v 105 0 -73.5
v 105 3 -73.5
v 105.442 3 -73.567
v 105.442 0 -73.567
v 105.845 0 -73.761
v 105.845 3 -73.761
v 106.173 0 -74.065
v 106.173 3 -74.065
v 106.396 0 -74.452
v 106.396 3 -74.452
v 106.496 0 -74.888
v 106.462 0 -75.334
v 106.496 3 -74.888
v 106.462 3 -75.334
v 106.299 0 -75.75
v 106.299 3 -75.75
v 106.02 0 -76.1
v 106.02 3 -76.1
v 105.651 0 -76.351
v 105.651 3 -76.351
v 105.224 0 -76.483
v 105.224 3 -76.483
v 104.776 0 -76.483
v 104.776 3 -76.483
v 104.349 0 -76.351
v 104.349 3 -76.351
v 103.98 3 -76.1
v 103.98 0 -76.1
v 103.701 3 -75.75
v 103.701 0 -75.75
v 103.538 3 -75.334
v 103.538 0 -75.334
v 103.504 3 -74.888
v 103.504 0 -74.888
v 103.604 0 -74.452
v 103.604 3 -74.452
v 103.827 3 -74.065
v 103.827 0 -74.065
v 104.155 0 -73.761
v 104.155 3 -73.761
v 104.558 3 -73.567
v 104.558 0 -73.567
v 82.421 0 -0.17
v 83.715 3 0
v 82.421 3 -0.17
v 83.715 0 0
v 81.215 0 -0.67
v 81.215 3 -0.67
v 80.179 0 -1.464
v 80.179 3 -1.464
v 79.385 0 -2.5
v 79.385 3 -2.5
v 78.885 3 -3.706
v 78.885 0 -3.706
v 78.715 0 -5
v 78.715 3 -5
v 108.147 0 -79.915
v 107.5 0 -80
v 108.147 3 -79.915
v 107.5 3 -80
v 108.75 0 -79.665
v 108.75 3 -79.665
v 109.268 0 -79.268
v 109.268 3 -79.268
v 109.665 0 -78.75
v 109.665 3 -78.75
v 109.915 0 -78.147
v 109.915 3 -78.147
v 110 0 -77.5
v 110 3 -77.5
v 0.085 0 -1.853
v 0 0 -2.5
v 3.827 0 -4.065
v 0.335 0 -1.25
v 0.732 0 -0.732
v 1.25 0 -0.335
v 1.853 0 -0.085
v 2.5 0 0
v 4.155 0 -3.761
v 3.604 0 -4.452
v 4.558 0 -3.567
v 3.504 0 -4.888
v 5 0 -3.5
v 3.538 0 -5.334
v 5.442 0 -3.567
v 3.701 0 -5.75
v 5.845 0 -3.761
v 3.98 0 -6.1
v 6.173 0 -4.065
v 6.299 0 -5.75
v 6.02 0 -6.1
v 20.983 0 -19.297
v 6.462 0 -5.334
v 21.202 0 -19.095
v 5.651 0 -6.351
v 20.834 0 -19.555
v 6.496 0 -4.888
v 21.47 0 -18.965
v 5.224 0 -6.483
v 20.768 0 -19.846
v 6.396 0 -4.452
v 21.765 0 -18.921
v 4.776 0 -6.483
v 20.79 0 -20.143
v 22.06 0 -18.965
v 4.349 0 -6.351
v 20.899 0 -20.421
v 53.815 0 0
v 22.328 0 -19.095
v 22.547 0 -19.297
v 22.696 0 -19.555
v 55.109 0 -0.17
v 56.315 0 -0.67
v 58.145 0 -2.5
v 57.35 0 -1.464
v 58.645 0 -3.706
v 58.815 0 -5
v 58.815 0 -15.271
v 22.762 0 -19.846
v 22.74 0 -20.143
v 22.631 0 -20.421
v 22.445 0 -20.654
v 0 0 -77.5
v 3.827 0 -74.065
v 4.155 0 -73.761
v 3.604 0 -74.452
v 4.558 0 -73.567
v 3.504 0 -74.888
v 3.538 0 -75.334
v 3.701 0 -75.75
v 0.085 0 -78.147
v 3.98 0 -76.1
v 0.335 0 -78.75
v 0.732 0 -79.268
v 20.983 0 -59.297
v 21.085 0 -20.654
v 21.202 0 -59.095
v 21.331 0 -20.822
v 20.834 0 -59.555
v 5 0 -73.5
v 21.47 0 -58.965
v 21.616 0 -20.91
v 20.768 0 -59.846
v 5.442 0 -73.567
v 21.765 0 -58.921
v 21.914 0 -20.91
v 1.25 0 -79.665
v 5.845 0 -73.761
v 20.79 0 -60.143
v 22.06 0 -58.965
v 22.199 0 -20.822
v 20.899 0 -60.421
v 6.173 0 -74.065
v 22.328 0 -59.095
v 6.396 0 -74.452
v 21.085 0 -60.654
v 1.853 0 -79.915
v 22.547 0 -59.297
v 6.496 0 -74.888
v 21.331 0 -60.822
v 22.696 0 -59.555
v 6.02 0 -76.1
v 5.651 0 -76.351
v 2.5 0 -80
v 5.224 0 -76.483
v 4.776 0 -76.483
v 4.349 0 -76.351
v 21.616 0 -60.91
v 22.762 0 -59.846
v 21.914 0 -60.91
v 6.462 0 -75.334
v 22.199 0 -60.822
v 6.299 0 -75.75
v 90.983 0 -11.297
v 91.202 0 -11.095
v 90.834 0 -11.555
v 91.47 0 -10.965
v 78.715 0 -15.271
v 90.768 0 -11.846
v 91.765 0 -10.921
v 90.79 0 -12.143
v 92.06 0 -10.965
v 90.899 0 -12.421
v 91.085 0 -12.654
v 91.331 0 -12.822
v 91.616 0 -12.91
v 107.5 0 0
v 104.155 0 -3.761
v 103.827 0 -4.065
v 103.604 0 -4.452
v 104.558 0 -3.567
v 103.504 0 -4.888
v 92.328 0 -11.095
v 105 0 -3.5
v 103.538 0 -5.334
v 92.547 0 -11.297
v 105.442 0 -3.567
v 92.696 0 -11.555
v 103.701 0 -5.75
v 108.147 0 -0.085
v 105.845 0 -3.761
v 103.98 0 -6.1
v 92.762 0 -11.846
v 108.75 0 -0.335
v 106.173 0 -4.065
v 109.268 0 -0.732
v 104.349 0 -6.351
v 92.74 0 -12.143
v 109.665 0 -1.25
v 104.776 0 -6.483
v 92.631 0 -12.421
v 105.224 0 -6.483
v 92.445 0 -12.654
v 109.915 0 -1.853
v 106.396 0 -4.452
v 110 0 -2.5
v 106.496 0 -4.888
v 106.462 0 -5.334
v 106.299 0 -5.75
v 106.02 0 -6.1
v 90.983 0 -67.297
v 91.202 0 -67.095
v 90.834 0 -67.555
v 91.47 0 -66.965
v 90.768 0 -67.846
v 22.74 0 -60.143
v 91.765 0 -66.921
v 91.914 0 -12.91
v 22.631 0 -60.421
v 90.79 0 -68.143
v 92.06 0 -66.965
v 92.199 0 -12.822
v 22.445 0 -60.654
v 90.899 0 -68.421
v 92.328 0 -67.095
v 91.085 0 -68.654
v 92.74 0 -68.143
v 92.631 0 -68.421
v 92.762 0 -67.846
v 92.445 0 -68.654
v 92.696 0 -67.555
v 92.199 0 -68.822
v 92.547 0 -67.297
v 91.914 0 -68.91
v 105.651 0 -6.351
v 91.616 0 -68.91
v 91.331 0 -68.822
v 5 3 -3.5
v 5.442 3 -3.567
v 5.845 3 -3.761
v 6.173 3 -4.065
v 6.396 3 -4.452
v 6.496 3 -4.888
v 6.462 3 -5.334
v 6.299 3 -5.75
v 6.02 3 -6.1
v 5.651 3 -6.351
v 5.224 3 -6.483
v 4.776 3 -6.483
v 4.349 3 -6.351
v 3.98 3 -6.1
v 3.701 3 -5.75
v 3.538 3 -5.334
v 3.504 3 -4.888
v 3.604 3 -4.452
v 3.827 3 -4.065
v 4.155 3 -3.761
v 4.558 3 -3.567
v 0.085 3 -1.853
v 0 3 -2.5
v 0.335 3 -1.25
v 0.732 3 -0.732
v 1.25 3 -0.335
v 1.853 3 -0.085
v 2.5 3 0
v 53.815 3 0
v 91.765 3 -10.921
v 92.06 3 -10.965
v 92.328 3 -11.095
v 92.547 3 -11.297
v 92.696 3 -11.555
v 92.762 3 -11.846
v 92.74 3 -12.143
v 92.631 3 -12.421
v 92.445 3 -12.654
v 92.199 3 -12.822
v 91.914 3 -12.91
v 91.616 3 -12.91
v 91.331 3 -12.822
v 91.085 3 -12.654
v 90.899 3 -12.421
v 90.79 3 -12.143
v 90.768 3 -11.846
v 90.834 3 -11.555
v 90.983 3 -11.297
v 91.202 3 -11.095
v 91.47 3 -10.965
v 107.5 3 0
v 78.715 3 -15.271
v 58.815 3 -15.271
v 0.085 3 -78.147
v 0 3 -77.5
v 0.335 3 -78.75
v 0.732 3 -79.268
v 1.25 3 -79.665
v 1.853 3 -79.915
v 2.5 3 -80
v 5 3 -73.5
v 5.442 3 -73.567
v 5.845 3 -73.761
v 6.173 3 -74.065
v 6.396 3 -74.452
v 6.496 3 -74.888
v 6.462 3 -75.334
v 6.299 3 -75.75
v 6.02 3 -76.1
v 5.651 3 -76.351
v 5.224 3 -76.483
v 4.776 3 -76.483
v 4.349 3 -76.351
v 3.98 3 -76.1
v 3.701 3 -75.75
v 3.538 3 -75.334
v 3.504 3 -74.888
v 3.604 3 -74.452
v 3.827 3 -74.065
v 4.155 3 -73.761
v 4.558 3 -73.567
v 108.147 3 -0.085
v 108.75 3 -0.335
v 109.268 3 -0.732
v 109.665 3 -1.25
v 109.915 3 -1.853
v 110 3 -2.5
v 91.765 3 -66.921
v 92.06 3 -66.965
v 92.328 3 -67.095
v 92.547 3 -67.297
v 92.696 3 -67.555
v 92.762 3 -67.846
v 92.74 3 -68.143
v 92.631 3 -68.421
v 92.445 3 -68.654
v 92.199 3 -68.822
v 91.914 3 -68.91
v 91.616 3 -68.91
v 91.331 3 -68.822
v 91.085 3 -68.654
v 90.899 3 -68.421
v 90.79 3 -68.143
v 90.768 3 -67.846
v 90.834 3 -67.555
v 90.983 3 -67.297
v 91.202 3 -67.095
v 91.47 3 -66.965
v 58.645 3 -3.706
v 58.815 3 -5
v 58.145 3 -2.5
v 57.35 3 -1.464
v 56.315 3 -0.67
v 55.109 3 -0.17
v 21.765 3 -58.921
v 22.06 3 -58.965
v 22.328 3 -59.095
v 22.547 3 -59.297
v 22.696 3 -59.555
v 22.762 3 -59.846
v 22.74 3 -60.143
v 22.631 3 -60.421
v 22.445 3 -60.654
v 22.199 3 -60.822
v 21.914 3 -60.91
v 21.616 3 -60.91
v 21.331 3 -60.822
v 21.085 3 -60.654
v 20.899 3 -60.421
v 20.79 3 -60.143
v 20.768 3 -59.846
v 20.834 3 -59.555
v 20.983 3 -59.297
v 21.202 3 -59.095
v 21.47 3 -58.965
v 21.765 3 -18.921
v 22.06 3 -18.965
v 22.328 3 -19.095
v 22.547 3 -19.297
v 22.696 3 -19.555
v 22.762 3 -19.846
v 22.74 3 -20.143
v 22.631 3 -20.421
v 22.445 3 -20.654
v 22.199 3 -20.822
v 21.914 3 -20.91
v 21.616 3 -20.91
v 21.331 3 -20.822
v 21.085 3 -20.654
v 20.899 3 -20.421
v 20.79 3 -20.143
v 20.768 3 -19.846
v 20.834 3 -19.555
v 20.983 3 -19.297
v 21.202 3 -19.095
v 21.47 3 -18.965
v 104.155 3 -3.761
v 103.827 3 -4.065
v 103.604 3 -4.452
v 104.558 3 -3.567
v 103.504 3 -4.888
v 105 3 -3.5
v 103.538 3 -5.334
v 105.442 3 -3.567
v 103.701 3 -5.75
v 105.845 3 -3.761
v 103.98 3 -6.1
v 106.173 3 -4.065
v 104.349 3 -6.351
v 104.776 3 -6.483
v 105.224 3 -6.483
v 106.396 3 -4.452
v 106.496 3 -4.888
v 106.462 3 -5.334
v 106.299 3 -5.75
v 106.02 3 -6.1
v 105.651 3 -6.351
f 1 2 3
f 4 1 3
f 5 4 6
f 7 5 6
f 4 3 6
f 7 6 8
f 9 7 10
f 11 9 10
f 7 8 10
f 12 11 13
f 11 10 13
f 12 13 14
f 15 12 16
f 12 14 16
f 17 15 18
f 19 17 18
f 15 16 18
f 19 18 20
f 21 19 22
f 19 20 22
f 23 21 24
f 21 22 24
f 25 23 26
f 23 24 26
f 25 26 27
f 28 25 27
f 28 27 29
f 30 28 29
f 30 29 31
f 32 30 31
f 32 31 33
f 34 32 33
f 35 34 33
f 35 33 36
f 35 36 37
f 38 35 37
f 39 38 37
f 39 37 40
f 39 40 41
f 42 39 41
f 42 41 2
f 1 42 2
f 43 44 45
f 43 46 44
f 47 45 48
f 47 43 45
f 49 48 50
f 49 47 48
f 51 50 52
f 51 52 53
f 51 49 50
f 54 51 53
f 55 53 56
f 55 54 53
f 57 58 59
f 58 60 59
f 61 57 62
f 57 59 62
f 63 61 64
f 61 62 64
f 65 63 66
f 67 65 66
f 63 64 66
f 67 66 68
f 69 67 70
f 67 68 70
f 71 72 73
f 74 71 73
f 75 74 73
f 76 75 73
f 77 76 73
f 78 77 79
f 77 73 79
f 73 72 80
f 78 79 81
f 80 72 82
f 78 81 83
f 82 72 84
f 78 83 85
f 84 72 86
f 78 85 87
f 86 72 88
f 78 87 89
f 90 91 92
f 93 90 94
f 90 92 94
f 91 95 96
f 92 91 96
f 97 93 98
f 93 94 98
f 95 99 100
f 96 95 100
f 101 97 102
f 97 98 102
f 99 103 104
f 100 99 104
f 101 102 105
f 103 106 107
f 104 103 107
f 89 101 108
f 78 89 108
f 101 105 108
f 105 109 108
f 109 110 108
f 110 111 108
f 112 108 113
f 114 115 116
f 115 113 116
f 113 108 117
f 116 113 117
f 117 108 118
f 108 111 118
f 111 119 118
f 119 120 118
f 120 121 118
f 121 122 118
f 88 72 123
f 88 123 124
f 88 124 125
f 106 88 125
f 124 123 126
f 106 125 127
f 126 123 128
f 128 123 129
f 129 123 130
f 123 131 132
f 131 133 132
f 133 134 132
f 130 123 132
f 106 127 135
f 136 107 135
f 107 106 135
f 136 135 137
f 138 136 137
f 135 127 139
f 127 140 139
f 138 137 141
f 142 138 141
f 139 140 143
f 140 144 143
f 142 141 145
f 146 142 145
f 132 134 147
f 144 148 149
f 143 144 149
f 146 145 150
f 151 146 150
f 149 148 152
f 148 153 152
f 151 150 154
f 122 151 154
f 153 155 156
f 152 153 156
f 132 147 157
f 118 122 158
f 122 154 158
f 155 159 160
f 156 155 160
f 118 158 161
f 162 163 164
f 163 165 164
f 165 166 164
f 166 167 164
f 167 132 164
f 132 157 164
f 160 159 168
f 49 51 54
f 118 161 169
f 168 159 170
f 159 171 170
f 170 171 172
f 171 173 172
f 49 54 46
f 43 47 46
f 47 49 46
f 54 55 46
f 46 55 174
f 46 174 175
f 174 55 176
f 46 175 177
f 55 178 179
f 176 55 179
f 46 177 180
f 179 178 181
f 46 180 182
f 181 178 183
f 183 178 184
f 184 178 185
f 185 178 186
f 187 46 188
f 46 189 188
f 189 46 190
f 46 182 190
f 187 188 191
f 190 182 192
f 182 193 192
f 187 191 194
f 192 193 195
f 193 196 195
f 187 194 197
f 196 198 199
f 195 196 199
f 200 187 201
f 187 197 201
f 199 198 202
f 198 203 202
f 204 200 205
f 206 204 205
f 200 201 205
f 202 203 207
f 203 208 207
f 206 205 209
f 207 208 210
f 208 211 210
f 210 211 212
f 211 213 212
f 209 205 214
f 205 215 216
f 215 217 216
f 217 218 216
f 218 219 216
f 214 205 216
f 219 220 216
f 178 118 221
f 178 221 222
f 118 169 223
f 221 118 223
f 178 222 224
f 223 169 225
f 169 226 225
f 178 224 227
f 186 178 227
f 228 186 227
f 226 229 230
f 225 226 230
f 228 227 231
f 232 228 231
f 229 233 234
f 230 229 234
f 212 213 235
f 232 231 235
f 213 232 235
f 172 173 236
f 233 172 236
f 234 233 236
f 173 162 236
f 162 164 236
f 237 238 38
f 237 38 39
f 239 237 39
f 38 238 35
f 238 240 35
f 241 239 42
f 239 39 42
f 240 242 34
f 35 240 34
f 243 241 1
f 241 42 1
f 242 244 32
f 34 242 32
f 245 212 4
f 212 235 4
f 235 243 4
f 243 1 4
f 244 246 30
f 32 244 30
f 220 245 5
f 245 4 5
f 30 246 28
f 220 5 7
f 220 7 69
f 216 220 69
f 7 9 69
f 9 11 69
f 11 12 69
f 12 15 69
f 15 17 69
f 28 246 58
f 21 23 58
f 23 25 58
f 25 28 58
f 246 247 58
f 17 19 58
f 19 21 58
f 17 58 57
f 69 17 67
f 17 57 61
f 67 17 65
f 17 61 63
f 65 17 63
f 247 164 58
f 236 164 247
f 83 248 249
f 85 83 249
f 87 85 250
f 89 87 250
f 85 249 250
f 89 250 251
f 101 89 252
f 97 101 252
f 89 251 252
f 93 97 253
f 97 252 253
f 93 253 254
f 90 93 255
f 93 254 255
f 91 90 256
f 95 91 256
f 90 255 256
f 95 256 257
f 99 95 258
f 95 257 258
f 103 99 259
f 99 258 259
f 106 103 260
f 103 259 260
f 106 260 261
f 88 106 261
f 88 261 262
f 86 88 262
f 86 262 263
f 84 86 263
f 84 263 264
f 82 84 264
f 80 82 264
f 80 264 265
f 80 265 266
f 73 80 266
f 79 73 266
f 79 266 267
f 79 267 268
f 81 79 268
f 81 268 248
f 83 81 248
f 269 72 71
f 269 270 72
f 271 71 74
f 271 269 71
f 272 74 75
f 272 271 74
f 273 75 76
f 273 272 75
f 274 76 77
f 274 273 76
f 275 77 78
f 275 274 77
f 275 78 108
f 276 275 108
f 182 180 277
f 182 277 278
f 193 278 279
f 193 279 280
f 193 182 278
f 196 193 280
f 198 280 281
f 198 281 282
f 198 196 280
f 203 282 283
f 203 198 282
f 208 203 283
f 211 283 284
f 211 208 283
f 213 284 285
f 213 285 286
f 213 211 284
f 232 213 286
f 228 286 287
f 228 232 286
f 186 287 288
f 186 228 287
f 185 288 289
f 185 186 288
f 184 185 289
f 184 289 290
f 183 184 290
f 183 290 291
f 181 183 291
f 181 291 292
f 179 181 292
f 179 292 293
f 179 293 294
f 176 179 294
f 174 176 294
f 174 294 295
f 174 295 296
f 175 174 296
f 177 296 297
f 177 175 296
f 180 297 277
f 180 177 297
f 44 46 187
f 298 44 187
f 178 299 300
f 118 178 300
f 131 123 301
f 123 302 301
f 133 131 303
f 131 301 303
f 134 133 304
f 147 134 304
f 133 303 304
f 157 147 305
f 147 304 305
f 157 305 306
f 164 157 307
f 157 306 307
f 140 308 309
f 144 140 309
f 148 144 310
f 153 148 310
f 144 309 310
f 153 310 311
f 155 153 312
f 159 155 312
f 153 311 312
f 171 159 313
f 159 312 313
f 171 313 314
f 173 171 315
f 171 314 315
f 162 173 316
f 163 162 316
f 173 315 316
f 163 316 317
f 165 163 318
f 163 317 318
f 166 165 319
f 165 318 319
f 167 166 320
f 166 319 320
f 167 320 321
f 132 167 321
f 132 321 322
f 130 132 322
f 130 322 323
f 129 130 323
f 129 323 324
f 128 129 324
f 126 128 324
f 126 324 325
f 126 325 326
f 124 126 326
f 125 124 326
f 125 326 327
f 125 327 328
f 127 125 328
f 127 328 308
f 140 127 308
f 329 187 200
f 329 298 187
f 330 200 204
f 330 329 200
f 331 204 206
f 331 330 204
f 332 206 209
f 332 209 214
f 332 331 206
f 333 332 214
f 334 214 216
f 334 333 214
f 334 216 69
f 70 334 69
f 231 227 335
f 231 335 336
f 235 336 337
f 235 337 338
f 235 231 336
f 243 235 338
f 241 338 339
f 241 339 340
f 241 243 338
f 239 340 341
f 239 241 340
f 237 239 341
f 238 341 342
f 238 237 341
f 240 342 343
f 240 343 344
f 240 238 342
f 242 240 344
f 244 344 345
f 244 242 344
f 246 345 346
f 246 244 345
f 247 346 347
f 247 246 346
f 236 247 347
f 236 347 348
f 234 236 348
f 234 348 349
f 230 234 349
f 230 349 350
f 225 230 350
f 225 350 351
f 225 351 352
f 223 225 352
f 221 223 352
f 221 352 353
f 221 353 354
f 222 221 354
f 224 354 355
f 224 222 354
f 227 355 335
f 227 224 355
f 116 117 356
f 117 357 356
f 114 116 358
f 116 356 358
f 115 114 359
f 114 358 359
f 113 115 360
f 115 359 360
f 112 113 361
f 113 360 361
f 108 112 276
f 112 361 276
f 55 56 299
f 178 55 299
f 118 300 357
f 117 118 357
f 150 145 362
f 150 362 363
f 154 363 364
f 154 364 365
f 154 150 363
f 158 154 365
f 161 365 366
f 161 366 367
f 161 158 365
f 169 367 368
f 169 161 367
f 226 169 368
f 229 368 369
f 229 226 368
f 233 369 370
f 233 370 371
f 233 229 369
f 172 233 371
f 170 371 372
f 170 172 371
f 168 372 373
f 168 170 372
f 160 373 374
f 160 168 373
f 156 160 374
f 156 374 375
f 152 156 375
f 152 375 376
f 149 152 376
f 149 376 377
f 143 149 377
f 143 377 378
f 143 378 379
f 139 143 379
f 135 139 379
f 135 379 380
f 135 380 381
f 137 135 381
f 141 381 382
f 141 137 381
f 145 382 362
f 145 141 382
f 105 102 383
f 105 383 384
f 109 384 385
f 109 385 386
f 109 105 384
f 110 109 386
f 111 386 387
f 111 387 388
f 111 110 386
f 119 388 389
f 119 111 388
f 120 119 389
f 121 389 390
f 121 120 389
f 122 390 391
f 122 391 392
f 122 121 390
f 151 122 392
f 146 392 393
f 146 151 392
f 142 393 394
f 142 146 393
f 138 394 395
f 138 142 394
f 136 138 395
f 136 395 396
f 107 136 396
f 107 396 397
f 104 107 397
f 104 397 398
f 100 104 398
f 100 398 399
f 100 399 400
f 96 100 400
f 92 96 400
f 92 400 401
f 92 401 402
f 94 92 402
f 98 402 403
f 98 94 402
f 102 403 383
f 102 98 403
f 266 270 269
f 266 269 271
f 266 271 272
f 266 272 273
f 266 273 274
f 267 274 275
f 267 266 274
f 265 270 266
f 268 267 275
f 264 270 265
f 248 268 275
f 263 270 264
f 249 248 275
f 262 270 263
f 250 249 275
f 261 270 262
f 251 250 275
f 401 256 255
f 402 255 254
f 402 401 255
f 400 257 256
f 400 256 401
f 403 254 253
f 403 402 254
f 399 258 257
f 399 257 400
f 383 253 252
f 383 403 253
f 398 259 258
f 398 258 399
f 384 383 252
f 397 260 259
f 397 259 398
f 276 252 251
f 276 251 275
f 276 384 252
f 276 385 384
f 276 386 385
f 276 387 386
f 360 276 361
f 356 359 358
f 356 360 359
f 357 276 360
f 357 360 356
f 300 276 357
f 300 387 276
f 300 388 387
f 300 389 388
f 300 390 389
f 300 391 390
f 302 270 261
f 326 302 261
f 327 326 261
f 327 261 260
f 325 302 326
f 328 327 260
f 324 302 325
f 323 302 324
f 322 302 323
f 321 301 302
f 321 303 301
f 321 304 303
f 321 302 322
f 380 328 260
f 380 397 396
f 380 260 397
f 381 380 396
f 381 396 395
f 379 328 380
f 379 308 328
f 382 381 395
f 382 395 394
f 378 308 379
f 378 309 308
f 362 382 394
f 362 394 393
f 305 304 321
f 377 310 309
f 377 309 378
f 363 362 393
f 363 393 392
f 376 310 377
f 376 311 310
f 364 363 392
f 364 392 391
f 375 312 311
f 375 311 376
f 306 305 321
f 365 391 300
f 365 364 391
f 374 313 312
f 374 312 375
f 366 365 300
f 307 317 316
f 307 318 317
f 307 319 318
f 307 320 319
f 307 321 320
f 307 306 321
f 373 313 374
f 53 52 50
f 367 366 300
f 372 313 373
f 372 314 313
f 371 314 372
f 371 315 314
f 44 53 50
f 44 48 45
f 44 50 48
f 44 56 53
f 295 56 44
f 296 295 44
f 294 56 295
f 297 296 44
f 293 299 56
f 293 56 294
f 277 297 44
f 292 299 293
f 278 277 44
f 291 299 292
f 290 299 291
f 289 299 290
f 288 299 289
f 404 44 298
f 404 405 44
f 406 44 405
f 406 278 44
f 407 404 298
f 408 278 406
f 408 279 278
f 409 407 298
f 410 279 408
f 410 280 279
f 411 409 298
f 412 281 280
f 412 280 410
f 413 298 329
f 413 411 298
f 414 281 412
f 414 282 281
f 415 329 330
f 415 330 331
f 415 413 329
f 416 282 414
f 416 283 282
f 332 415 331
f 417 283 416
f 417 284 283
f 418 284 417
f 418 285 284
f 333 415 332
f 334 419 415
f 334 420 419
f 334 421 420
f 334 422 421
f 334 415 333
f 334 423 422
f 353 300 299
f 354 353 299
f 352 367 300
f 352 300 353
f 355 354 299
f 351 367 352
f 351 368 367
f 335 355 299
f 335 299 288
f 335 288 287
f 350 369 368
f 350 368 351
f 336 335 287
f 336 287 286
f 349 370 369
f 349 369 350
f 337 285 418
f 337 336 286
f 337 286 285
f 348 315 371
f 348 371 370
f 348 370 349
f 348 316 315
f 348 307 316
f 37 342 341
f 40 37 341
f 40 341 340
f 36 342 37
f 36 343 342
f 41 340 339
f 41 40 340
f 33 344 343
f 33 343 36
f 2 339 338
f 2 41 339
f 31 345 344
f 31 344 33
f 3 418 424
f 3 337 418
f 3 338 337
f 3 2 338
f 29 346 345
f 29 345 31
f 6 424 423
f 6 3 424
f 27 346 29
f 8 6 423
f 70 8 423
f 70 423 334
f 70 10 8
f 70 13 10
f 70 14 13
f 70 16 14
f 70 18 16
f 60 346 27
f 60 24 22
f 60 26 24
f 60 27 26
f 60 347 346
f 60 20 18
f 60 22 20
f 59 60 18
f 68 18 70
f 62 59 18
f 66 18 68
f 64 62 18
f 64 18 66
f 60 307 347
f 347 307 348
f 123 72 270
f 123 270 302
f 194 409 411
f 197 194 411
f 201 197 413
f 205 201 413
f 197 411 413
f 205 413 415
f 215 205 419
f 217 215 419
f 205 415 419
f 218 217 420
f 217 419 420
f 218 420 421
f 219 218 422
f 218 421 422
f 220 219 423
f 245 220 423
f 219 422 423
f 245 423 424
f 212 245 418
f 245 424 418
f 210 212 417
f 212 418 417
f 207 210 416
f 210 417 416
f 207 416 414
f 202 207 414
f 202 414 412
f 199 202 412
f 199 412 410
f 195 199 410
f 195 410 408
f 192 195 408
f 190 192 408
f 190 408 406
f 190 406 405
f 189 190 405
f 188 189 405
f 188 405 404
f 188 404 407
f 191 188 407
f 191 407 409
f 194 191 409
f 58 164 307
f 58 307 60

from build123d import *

# Parameters (mm, degrees)
SKETCH5_W           = 110
SKETCH5_H           = 80
SKETCH5_R           = 1
BOSS_EXTRUDE1_DEPTH = 3
SKETCH6_R           = 1.5
CUT_EXTRUDE1_DEPTH  = 137.047785723
FILLET1_R           = 2.5
CUT_EXTRUDE2_DEPTH  = 6
FILLET2_R           = 5


with BuildPart() as part:
    # Sketch5 → Boss-Extrude1 (new body)
    with BuildSketch(Plane(origin=(0, 0, 0), x_dir=(1, 0, 0), z_dir=(0, 1, 0))):
        with Locations((55, 40)):
            Rectangle(SKETCH5_W, SKETCH5_H)
        with Locations(Location((91.764887736, 67.92075713, 0), (0, 0, 270))):
            Circle(SKETCH5_R, mode=Mode.SUBTRACT)
        with Locations(Location((21.764888364, 59.920762627, 0), (0, 0, 270))):
            Circle(SKETCH5_R, mode=Mode.SUBTRACT)
        with Locations(Location((21.764888364, 19.920762627, 0), (0, 0, 270))):
            Circle(SKETCH5_R, mode=Mode.SUBTRACT)
        with Locations(Location((91.764887736, 11.92075713, 0), (0, 0, 270))):
            Circle(SKETCH5_R, mode=Mode.SUBTRACT)
    extrude(amount=BOSS_EXTRUDE1_DEPTH)

    # Sketch6 → Cut-Extrude1 (cut, through all)
    with BuildSketch(Plane(origin=(0, 3, 0), x_dir=(1, 0, 0), z_dir=(0, 1, 0))):
        with Locations(Location((5, 75, 0), (0, 0, 270))):
            Circle(SKETCH6_R)
        with Locations(Location((105, 75, 0), (0, 0, 270))):
            Circle(SKETCH6_R)
        with Locations(Location((105, 5, 0), (0, 0, 270))):
            Circle(SKETCH6_R)
        with Locations(Location((5, 5, 0), (0, 0, 270))):
            Circle(SKETCH6_R)
    extrude(amount=-CUT_EXTRUDE1_DEPTH, mode=Mode.SUBTRACT)

    # Fillet1
    fillet1_edges = [part.edges().sort_by_distance(p)[0] for p in [
        (0, 1.5, -80),
        (110, 1.5, -80),
        (110, 1.5, 0),
        (0, 1.5, 0),
    ]]
    fillet(fillet1_edges, radius=FILLET1_R)

    # Sketch7 → Cut-Extrude2 (cut)
    with BuildSketch(Plane(origin=(0, 3, 0), x_dir=(1, 0, 0), z_dir=(0, 1, 0))):
        Polygon((78.714883487, -234.464098532), (78.714883487, 0), (78.714883487, 15.270760033), (58.814883708, 15.270760033), (58.814883708, 0), (58.814883708, -234.464098532), (58.814883708, -703.392295596), (78.714883487, -703.392295596), align=None)
    extrude(amount=-CUT_EXTRUDE2_DEPTH, mode=Mode.SUBTRACT)

    # Fillet2
    fillet2_edges = [part.edges().sort_by_distance(p)[0] for p in [
        (78.714883487, 1.5, 0),
        (58.814883708, 1.5, 0),
    ]]
    fillet(fillet2_edges, radius=FILLET2_R)


solid = part.part
